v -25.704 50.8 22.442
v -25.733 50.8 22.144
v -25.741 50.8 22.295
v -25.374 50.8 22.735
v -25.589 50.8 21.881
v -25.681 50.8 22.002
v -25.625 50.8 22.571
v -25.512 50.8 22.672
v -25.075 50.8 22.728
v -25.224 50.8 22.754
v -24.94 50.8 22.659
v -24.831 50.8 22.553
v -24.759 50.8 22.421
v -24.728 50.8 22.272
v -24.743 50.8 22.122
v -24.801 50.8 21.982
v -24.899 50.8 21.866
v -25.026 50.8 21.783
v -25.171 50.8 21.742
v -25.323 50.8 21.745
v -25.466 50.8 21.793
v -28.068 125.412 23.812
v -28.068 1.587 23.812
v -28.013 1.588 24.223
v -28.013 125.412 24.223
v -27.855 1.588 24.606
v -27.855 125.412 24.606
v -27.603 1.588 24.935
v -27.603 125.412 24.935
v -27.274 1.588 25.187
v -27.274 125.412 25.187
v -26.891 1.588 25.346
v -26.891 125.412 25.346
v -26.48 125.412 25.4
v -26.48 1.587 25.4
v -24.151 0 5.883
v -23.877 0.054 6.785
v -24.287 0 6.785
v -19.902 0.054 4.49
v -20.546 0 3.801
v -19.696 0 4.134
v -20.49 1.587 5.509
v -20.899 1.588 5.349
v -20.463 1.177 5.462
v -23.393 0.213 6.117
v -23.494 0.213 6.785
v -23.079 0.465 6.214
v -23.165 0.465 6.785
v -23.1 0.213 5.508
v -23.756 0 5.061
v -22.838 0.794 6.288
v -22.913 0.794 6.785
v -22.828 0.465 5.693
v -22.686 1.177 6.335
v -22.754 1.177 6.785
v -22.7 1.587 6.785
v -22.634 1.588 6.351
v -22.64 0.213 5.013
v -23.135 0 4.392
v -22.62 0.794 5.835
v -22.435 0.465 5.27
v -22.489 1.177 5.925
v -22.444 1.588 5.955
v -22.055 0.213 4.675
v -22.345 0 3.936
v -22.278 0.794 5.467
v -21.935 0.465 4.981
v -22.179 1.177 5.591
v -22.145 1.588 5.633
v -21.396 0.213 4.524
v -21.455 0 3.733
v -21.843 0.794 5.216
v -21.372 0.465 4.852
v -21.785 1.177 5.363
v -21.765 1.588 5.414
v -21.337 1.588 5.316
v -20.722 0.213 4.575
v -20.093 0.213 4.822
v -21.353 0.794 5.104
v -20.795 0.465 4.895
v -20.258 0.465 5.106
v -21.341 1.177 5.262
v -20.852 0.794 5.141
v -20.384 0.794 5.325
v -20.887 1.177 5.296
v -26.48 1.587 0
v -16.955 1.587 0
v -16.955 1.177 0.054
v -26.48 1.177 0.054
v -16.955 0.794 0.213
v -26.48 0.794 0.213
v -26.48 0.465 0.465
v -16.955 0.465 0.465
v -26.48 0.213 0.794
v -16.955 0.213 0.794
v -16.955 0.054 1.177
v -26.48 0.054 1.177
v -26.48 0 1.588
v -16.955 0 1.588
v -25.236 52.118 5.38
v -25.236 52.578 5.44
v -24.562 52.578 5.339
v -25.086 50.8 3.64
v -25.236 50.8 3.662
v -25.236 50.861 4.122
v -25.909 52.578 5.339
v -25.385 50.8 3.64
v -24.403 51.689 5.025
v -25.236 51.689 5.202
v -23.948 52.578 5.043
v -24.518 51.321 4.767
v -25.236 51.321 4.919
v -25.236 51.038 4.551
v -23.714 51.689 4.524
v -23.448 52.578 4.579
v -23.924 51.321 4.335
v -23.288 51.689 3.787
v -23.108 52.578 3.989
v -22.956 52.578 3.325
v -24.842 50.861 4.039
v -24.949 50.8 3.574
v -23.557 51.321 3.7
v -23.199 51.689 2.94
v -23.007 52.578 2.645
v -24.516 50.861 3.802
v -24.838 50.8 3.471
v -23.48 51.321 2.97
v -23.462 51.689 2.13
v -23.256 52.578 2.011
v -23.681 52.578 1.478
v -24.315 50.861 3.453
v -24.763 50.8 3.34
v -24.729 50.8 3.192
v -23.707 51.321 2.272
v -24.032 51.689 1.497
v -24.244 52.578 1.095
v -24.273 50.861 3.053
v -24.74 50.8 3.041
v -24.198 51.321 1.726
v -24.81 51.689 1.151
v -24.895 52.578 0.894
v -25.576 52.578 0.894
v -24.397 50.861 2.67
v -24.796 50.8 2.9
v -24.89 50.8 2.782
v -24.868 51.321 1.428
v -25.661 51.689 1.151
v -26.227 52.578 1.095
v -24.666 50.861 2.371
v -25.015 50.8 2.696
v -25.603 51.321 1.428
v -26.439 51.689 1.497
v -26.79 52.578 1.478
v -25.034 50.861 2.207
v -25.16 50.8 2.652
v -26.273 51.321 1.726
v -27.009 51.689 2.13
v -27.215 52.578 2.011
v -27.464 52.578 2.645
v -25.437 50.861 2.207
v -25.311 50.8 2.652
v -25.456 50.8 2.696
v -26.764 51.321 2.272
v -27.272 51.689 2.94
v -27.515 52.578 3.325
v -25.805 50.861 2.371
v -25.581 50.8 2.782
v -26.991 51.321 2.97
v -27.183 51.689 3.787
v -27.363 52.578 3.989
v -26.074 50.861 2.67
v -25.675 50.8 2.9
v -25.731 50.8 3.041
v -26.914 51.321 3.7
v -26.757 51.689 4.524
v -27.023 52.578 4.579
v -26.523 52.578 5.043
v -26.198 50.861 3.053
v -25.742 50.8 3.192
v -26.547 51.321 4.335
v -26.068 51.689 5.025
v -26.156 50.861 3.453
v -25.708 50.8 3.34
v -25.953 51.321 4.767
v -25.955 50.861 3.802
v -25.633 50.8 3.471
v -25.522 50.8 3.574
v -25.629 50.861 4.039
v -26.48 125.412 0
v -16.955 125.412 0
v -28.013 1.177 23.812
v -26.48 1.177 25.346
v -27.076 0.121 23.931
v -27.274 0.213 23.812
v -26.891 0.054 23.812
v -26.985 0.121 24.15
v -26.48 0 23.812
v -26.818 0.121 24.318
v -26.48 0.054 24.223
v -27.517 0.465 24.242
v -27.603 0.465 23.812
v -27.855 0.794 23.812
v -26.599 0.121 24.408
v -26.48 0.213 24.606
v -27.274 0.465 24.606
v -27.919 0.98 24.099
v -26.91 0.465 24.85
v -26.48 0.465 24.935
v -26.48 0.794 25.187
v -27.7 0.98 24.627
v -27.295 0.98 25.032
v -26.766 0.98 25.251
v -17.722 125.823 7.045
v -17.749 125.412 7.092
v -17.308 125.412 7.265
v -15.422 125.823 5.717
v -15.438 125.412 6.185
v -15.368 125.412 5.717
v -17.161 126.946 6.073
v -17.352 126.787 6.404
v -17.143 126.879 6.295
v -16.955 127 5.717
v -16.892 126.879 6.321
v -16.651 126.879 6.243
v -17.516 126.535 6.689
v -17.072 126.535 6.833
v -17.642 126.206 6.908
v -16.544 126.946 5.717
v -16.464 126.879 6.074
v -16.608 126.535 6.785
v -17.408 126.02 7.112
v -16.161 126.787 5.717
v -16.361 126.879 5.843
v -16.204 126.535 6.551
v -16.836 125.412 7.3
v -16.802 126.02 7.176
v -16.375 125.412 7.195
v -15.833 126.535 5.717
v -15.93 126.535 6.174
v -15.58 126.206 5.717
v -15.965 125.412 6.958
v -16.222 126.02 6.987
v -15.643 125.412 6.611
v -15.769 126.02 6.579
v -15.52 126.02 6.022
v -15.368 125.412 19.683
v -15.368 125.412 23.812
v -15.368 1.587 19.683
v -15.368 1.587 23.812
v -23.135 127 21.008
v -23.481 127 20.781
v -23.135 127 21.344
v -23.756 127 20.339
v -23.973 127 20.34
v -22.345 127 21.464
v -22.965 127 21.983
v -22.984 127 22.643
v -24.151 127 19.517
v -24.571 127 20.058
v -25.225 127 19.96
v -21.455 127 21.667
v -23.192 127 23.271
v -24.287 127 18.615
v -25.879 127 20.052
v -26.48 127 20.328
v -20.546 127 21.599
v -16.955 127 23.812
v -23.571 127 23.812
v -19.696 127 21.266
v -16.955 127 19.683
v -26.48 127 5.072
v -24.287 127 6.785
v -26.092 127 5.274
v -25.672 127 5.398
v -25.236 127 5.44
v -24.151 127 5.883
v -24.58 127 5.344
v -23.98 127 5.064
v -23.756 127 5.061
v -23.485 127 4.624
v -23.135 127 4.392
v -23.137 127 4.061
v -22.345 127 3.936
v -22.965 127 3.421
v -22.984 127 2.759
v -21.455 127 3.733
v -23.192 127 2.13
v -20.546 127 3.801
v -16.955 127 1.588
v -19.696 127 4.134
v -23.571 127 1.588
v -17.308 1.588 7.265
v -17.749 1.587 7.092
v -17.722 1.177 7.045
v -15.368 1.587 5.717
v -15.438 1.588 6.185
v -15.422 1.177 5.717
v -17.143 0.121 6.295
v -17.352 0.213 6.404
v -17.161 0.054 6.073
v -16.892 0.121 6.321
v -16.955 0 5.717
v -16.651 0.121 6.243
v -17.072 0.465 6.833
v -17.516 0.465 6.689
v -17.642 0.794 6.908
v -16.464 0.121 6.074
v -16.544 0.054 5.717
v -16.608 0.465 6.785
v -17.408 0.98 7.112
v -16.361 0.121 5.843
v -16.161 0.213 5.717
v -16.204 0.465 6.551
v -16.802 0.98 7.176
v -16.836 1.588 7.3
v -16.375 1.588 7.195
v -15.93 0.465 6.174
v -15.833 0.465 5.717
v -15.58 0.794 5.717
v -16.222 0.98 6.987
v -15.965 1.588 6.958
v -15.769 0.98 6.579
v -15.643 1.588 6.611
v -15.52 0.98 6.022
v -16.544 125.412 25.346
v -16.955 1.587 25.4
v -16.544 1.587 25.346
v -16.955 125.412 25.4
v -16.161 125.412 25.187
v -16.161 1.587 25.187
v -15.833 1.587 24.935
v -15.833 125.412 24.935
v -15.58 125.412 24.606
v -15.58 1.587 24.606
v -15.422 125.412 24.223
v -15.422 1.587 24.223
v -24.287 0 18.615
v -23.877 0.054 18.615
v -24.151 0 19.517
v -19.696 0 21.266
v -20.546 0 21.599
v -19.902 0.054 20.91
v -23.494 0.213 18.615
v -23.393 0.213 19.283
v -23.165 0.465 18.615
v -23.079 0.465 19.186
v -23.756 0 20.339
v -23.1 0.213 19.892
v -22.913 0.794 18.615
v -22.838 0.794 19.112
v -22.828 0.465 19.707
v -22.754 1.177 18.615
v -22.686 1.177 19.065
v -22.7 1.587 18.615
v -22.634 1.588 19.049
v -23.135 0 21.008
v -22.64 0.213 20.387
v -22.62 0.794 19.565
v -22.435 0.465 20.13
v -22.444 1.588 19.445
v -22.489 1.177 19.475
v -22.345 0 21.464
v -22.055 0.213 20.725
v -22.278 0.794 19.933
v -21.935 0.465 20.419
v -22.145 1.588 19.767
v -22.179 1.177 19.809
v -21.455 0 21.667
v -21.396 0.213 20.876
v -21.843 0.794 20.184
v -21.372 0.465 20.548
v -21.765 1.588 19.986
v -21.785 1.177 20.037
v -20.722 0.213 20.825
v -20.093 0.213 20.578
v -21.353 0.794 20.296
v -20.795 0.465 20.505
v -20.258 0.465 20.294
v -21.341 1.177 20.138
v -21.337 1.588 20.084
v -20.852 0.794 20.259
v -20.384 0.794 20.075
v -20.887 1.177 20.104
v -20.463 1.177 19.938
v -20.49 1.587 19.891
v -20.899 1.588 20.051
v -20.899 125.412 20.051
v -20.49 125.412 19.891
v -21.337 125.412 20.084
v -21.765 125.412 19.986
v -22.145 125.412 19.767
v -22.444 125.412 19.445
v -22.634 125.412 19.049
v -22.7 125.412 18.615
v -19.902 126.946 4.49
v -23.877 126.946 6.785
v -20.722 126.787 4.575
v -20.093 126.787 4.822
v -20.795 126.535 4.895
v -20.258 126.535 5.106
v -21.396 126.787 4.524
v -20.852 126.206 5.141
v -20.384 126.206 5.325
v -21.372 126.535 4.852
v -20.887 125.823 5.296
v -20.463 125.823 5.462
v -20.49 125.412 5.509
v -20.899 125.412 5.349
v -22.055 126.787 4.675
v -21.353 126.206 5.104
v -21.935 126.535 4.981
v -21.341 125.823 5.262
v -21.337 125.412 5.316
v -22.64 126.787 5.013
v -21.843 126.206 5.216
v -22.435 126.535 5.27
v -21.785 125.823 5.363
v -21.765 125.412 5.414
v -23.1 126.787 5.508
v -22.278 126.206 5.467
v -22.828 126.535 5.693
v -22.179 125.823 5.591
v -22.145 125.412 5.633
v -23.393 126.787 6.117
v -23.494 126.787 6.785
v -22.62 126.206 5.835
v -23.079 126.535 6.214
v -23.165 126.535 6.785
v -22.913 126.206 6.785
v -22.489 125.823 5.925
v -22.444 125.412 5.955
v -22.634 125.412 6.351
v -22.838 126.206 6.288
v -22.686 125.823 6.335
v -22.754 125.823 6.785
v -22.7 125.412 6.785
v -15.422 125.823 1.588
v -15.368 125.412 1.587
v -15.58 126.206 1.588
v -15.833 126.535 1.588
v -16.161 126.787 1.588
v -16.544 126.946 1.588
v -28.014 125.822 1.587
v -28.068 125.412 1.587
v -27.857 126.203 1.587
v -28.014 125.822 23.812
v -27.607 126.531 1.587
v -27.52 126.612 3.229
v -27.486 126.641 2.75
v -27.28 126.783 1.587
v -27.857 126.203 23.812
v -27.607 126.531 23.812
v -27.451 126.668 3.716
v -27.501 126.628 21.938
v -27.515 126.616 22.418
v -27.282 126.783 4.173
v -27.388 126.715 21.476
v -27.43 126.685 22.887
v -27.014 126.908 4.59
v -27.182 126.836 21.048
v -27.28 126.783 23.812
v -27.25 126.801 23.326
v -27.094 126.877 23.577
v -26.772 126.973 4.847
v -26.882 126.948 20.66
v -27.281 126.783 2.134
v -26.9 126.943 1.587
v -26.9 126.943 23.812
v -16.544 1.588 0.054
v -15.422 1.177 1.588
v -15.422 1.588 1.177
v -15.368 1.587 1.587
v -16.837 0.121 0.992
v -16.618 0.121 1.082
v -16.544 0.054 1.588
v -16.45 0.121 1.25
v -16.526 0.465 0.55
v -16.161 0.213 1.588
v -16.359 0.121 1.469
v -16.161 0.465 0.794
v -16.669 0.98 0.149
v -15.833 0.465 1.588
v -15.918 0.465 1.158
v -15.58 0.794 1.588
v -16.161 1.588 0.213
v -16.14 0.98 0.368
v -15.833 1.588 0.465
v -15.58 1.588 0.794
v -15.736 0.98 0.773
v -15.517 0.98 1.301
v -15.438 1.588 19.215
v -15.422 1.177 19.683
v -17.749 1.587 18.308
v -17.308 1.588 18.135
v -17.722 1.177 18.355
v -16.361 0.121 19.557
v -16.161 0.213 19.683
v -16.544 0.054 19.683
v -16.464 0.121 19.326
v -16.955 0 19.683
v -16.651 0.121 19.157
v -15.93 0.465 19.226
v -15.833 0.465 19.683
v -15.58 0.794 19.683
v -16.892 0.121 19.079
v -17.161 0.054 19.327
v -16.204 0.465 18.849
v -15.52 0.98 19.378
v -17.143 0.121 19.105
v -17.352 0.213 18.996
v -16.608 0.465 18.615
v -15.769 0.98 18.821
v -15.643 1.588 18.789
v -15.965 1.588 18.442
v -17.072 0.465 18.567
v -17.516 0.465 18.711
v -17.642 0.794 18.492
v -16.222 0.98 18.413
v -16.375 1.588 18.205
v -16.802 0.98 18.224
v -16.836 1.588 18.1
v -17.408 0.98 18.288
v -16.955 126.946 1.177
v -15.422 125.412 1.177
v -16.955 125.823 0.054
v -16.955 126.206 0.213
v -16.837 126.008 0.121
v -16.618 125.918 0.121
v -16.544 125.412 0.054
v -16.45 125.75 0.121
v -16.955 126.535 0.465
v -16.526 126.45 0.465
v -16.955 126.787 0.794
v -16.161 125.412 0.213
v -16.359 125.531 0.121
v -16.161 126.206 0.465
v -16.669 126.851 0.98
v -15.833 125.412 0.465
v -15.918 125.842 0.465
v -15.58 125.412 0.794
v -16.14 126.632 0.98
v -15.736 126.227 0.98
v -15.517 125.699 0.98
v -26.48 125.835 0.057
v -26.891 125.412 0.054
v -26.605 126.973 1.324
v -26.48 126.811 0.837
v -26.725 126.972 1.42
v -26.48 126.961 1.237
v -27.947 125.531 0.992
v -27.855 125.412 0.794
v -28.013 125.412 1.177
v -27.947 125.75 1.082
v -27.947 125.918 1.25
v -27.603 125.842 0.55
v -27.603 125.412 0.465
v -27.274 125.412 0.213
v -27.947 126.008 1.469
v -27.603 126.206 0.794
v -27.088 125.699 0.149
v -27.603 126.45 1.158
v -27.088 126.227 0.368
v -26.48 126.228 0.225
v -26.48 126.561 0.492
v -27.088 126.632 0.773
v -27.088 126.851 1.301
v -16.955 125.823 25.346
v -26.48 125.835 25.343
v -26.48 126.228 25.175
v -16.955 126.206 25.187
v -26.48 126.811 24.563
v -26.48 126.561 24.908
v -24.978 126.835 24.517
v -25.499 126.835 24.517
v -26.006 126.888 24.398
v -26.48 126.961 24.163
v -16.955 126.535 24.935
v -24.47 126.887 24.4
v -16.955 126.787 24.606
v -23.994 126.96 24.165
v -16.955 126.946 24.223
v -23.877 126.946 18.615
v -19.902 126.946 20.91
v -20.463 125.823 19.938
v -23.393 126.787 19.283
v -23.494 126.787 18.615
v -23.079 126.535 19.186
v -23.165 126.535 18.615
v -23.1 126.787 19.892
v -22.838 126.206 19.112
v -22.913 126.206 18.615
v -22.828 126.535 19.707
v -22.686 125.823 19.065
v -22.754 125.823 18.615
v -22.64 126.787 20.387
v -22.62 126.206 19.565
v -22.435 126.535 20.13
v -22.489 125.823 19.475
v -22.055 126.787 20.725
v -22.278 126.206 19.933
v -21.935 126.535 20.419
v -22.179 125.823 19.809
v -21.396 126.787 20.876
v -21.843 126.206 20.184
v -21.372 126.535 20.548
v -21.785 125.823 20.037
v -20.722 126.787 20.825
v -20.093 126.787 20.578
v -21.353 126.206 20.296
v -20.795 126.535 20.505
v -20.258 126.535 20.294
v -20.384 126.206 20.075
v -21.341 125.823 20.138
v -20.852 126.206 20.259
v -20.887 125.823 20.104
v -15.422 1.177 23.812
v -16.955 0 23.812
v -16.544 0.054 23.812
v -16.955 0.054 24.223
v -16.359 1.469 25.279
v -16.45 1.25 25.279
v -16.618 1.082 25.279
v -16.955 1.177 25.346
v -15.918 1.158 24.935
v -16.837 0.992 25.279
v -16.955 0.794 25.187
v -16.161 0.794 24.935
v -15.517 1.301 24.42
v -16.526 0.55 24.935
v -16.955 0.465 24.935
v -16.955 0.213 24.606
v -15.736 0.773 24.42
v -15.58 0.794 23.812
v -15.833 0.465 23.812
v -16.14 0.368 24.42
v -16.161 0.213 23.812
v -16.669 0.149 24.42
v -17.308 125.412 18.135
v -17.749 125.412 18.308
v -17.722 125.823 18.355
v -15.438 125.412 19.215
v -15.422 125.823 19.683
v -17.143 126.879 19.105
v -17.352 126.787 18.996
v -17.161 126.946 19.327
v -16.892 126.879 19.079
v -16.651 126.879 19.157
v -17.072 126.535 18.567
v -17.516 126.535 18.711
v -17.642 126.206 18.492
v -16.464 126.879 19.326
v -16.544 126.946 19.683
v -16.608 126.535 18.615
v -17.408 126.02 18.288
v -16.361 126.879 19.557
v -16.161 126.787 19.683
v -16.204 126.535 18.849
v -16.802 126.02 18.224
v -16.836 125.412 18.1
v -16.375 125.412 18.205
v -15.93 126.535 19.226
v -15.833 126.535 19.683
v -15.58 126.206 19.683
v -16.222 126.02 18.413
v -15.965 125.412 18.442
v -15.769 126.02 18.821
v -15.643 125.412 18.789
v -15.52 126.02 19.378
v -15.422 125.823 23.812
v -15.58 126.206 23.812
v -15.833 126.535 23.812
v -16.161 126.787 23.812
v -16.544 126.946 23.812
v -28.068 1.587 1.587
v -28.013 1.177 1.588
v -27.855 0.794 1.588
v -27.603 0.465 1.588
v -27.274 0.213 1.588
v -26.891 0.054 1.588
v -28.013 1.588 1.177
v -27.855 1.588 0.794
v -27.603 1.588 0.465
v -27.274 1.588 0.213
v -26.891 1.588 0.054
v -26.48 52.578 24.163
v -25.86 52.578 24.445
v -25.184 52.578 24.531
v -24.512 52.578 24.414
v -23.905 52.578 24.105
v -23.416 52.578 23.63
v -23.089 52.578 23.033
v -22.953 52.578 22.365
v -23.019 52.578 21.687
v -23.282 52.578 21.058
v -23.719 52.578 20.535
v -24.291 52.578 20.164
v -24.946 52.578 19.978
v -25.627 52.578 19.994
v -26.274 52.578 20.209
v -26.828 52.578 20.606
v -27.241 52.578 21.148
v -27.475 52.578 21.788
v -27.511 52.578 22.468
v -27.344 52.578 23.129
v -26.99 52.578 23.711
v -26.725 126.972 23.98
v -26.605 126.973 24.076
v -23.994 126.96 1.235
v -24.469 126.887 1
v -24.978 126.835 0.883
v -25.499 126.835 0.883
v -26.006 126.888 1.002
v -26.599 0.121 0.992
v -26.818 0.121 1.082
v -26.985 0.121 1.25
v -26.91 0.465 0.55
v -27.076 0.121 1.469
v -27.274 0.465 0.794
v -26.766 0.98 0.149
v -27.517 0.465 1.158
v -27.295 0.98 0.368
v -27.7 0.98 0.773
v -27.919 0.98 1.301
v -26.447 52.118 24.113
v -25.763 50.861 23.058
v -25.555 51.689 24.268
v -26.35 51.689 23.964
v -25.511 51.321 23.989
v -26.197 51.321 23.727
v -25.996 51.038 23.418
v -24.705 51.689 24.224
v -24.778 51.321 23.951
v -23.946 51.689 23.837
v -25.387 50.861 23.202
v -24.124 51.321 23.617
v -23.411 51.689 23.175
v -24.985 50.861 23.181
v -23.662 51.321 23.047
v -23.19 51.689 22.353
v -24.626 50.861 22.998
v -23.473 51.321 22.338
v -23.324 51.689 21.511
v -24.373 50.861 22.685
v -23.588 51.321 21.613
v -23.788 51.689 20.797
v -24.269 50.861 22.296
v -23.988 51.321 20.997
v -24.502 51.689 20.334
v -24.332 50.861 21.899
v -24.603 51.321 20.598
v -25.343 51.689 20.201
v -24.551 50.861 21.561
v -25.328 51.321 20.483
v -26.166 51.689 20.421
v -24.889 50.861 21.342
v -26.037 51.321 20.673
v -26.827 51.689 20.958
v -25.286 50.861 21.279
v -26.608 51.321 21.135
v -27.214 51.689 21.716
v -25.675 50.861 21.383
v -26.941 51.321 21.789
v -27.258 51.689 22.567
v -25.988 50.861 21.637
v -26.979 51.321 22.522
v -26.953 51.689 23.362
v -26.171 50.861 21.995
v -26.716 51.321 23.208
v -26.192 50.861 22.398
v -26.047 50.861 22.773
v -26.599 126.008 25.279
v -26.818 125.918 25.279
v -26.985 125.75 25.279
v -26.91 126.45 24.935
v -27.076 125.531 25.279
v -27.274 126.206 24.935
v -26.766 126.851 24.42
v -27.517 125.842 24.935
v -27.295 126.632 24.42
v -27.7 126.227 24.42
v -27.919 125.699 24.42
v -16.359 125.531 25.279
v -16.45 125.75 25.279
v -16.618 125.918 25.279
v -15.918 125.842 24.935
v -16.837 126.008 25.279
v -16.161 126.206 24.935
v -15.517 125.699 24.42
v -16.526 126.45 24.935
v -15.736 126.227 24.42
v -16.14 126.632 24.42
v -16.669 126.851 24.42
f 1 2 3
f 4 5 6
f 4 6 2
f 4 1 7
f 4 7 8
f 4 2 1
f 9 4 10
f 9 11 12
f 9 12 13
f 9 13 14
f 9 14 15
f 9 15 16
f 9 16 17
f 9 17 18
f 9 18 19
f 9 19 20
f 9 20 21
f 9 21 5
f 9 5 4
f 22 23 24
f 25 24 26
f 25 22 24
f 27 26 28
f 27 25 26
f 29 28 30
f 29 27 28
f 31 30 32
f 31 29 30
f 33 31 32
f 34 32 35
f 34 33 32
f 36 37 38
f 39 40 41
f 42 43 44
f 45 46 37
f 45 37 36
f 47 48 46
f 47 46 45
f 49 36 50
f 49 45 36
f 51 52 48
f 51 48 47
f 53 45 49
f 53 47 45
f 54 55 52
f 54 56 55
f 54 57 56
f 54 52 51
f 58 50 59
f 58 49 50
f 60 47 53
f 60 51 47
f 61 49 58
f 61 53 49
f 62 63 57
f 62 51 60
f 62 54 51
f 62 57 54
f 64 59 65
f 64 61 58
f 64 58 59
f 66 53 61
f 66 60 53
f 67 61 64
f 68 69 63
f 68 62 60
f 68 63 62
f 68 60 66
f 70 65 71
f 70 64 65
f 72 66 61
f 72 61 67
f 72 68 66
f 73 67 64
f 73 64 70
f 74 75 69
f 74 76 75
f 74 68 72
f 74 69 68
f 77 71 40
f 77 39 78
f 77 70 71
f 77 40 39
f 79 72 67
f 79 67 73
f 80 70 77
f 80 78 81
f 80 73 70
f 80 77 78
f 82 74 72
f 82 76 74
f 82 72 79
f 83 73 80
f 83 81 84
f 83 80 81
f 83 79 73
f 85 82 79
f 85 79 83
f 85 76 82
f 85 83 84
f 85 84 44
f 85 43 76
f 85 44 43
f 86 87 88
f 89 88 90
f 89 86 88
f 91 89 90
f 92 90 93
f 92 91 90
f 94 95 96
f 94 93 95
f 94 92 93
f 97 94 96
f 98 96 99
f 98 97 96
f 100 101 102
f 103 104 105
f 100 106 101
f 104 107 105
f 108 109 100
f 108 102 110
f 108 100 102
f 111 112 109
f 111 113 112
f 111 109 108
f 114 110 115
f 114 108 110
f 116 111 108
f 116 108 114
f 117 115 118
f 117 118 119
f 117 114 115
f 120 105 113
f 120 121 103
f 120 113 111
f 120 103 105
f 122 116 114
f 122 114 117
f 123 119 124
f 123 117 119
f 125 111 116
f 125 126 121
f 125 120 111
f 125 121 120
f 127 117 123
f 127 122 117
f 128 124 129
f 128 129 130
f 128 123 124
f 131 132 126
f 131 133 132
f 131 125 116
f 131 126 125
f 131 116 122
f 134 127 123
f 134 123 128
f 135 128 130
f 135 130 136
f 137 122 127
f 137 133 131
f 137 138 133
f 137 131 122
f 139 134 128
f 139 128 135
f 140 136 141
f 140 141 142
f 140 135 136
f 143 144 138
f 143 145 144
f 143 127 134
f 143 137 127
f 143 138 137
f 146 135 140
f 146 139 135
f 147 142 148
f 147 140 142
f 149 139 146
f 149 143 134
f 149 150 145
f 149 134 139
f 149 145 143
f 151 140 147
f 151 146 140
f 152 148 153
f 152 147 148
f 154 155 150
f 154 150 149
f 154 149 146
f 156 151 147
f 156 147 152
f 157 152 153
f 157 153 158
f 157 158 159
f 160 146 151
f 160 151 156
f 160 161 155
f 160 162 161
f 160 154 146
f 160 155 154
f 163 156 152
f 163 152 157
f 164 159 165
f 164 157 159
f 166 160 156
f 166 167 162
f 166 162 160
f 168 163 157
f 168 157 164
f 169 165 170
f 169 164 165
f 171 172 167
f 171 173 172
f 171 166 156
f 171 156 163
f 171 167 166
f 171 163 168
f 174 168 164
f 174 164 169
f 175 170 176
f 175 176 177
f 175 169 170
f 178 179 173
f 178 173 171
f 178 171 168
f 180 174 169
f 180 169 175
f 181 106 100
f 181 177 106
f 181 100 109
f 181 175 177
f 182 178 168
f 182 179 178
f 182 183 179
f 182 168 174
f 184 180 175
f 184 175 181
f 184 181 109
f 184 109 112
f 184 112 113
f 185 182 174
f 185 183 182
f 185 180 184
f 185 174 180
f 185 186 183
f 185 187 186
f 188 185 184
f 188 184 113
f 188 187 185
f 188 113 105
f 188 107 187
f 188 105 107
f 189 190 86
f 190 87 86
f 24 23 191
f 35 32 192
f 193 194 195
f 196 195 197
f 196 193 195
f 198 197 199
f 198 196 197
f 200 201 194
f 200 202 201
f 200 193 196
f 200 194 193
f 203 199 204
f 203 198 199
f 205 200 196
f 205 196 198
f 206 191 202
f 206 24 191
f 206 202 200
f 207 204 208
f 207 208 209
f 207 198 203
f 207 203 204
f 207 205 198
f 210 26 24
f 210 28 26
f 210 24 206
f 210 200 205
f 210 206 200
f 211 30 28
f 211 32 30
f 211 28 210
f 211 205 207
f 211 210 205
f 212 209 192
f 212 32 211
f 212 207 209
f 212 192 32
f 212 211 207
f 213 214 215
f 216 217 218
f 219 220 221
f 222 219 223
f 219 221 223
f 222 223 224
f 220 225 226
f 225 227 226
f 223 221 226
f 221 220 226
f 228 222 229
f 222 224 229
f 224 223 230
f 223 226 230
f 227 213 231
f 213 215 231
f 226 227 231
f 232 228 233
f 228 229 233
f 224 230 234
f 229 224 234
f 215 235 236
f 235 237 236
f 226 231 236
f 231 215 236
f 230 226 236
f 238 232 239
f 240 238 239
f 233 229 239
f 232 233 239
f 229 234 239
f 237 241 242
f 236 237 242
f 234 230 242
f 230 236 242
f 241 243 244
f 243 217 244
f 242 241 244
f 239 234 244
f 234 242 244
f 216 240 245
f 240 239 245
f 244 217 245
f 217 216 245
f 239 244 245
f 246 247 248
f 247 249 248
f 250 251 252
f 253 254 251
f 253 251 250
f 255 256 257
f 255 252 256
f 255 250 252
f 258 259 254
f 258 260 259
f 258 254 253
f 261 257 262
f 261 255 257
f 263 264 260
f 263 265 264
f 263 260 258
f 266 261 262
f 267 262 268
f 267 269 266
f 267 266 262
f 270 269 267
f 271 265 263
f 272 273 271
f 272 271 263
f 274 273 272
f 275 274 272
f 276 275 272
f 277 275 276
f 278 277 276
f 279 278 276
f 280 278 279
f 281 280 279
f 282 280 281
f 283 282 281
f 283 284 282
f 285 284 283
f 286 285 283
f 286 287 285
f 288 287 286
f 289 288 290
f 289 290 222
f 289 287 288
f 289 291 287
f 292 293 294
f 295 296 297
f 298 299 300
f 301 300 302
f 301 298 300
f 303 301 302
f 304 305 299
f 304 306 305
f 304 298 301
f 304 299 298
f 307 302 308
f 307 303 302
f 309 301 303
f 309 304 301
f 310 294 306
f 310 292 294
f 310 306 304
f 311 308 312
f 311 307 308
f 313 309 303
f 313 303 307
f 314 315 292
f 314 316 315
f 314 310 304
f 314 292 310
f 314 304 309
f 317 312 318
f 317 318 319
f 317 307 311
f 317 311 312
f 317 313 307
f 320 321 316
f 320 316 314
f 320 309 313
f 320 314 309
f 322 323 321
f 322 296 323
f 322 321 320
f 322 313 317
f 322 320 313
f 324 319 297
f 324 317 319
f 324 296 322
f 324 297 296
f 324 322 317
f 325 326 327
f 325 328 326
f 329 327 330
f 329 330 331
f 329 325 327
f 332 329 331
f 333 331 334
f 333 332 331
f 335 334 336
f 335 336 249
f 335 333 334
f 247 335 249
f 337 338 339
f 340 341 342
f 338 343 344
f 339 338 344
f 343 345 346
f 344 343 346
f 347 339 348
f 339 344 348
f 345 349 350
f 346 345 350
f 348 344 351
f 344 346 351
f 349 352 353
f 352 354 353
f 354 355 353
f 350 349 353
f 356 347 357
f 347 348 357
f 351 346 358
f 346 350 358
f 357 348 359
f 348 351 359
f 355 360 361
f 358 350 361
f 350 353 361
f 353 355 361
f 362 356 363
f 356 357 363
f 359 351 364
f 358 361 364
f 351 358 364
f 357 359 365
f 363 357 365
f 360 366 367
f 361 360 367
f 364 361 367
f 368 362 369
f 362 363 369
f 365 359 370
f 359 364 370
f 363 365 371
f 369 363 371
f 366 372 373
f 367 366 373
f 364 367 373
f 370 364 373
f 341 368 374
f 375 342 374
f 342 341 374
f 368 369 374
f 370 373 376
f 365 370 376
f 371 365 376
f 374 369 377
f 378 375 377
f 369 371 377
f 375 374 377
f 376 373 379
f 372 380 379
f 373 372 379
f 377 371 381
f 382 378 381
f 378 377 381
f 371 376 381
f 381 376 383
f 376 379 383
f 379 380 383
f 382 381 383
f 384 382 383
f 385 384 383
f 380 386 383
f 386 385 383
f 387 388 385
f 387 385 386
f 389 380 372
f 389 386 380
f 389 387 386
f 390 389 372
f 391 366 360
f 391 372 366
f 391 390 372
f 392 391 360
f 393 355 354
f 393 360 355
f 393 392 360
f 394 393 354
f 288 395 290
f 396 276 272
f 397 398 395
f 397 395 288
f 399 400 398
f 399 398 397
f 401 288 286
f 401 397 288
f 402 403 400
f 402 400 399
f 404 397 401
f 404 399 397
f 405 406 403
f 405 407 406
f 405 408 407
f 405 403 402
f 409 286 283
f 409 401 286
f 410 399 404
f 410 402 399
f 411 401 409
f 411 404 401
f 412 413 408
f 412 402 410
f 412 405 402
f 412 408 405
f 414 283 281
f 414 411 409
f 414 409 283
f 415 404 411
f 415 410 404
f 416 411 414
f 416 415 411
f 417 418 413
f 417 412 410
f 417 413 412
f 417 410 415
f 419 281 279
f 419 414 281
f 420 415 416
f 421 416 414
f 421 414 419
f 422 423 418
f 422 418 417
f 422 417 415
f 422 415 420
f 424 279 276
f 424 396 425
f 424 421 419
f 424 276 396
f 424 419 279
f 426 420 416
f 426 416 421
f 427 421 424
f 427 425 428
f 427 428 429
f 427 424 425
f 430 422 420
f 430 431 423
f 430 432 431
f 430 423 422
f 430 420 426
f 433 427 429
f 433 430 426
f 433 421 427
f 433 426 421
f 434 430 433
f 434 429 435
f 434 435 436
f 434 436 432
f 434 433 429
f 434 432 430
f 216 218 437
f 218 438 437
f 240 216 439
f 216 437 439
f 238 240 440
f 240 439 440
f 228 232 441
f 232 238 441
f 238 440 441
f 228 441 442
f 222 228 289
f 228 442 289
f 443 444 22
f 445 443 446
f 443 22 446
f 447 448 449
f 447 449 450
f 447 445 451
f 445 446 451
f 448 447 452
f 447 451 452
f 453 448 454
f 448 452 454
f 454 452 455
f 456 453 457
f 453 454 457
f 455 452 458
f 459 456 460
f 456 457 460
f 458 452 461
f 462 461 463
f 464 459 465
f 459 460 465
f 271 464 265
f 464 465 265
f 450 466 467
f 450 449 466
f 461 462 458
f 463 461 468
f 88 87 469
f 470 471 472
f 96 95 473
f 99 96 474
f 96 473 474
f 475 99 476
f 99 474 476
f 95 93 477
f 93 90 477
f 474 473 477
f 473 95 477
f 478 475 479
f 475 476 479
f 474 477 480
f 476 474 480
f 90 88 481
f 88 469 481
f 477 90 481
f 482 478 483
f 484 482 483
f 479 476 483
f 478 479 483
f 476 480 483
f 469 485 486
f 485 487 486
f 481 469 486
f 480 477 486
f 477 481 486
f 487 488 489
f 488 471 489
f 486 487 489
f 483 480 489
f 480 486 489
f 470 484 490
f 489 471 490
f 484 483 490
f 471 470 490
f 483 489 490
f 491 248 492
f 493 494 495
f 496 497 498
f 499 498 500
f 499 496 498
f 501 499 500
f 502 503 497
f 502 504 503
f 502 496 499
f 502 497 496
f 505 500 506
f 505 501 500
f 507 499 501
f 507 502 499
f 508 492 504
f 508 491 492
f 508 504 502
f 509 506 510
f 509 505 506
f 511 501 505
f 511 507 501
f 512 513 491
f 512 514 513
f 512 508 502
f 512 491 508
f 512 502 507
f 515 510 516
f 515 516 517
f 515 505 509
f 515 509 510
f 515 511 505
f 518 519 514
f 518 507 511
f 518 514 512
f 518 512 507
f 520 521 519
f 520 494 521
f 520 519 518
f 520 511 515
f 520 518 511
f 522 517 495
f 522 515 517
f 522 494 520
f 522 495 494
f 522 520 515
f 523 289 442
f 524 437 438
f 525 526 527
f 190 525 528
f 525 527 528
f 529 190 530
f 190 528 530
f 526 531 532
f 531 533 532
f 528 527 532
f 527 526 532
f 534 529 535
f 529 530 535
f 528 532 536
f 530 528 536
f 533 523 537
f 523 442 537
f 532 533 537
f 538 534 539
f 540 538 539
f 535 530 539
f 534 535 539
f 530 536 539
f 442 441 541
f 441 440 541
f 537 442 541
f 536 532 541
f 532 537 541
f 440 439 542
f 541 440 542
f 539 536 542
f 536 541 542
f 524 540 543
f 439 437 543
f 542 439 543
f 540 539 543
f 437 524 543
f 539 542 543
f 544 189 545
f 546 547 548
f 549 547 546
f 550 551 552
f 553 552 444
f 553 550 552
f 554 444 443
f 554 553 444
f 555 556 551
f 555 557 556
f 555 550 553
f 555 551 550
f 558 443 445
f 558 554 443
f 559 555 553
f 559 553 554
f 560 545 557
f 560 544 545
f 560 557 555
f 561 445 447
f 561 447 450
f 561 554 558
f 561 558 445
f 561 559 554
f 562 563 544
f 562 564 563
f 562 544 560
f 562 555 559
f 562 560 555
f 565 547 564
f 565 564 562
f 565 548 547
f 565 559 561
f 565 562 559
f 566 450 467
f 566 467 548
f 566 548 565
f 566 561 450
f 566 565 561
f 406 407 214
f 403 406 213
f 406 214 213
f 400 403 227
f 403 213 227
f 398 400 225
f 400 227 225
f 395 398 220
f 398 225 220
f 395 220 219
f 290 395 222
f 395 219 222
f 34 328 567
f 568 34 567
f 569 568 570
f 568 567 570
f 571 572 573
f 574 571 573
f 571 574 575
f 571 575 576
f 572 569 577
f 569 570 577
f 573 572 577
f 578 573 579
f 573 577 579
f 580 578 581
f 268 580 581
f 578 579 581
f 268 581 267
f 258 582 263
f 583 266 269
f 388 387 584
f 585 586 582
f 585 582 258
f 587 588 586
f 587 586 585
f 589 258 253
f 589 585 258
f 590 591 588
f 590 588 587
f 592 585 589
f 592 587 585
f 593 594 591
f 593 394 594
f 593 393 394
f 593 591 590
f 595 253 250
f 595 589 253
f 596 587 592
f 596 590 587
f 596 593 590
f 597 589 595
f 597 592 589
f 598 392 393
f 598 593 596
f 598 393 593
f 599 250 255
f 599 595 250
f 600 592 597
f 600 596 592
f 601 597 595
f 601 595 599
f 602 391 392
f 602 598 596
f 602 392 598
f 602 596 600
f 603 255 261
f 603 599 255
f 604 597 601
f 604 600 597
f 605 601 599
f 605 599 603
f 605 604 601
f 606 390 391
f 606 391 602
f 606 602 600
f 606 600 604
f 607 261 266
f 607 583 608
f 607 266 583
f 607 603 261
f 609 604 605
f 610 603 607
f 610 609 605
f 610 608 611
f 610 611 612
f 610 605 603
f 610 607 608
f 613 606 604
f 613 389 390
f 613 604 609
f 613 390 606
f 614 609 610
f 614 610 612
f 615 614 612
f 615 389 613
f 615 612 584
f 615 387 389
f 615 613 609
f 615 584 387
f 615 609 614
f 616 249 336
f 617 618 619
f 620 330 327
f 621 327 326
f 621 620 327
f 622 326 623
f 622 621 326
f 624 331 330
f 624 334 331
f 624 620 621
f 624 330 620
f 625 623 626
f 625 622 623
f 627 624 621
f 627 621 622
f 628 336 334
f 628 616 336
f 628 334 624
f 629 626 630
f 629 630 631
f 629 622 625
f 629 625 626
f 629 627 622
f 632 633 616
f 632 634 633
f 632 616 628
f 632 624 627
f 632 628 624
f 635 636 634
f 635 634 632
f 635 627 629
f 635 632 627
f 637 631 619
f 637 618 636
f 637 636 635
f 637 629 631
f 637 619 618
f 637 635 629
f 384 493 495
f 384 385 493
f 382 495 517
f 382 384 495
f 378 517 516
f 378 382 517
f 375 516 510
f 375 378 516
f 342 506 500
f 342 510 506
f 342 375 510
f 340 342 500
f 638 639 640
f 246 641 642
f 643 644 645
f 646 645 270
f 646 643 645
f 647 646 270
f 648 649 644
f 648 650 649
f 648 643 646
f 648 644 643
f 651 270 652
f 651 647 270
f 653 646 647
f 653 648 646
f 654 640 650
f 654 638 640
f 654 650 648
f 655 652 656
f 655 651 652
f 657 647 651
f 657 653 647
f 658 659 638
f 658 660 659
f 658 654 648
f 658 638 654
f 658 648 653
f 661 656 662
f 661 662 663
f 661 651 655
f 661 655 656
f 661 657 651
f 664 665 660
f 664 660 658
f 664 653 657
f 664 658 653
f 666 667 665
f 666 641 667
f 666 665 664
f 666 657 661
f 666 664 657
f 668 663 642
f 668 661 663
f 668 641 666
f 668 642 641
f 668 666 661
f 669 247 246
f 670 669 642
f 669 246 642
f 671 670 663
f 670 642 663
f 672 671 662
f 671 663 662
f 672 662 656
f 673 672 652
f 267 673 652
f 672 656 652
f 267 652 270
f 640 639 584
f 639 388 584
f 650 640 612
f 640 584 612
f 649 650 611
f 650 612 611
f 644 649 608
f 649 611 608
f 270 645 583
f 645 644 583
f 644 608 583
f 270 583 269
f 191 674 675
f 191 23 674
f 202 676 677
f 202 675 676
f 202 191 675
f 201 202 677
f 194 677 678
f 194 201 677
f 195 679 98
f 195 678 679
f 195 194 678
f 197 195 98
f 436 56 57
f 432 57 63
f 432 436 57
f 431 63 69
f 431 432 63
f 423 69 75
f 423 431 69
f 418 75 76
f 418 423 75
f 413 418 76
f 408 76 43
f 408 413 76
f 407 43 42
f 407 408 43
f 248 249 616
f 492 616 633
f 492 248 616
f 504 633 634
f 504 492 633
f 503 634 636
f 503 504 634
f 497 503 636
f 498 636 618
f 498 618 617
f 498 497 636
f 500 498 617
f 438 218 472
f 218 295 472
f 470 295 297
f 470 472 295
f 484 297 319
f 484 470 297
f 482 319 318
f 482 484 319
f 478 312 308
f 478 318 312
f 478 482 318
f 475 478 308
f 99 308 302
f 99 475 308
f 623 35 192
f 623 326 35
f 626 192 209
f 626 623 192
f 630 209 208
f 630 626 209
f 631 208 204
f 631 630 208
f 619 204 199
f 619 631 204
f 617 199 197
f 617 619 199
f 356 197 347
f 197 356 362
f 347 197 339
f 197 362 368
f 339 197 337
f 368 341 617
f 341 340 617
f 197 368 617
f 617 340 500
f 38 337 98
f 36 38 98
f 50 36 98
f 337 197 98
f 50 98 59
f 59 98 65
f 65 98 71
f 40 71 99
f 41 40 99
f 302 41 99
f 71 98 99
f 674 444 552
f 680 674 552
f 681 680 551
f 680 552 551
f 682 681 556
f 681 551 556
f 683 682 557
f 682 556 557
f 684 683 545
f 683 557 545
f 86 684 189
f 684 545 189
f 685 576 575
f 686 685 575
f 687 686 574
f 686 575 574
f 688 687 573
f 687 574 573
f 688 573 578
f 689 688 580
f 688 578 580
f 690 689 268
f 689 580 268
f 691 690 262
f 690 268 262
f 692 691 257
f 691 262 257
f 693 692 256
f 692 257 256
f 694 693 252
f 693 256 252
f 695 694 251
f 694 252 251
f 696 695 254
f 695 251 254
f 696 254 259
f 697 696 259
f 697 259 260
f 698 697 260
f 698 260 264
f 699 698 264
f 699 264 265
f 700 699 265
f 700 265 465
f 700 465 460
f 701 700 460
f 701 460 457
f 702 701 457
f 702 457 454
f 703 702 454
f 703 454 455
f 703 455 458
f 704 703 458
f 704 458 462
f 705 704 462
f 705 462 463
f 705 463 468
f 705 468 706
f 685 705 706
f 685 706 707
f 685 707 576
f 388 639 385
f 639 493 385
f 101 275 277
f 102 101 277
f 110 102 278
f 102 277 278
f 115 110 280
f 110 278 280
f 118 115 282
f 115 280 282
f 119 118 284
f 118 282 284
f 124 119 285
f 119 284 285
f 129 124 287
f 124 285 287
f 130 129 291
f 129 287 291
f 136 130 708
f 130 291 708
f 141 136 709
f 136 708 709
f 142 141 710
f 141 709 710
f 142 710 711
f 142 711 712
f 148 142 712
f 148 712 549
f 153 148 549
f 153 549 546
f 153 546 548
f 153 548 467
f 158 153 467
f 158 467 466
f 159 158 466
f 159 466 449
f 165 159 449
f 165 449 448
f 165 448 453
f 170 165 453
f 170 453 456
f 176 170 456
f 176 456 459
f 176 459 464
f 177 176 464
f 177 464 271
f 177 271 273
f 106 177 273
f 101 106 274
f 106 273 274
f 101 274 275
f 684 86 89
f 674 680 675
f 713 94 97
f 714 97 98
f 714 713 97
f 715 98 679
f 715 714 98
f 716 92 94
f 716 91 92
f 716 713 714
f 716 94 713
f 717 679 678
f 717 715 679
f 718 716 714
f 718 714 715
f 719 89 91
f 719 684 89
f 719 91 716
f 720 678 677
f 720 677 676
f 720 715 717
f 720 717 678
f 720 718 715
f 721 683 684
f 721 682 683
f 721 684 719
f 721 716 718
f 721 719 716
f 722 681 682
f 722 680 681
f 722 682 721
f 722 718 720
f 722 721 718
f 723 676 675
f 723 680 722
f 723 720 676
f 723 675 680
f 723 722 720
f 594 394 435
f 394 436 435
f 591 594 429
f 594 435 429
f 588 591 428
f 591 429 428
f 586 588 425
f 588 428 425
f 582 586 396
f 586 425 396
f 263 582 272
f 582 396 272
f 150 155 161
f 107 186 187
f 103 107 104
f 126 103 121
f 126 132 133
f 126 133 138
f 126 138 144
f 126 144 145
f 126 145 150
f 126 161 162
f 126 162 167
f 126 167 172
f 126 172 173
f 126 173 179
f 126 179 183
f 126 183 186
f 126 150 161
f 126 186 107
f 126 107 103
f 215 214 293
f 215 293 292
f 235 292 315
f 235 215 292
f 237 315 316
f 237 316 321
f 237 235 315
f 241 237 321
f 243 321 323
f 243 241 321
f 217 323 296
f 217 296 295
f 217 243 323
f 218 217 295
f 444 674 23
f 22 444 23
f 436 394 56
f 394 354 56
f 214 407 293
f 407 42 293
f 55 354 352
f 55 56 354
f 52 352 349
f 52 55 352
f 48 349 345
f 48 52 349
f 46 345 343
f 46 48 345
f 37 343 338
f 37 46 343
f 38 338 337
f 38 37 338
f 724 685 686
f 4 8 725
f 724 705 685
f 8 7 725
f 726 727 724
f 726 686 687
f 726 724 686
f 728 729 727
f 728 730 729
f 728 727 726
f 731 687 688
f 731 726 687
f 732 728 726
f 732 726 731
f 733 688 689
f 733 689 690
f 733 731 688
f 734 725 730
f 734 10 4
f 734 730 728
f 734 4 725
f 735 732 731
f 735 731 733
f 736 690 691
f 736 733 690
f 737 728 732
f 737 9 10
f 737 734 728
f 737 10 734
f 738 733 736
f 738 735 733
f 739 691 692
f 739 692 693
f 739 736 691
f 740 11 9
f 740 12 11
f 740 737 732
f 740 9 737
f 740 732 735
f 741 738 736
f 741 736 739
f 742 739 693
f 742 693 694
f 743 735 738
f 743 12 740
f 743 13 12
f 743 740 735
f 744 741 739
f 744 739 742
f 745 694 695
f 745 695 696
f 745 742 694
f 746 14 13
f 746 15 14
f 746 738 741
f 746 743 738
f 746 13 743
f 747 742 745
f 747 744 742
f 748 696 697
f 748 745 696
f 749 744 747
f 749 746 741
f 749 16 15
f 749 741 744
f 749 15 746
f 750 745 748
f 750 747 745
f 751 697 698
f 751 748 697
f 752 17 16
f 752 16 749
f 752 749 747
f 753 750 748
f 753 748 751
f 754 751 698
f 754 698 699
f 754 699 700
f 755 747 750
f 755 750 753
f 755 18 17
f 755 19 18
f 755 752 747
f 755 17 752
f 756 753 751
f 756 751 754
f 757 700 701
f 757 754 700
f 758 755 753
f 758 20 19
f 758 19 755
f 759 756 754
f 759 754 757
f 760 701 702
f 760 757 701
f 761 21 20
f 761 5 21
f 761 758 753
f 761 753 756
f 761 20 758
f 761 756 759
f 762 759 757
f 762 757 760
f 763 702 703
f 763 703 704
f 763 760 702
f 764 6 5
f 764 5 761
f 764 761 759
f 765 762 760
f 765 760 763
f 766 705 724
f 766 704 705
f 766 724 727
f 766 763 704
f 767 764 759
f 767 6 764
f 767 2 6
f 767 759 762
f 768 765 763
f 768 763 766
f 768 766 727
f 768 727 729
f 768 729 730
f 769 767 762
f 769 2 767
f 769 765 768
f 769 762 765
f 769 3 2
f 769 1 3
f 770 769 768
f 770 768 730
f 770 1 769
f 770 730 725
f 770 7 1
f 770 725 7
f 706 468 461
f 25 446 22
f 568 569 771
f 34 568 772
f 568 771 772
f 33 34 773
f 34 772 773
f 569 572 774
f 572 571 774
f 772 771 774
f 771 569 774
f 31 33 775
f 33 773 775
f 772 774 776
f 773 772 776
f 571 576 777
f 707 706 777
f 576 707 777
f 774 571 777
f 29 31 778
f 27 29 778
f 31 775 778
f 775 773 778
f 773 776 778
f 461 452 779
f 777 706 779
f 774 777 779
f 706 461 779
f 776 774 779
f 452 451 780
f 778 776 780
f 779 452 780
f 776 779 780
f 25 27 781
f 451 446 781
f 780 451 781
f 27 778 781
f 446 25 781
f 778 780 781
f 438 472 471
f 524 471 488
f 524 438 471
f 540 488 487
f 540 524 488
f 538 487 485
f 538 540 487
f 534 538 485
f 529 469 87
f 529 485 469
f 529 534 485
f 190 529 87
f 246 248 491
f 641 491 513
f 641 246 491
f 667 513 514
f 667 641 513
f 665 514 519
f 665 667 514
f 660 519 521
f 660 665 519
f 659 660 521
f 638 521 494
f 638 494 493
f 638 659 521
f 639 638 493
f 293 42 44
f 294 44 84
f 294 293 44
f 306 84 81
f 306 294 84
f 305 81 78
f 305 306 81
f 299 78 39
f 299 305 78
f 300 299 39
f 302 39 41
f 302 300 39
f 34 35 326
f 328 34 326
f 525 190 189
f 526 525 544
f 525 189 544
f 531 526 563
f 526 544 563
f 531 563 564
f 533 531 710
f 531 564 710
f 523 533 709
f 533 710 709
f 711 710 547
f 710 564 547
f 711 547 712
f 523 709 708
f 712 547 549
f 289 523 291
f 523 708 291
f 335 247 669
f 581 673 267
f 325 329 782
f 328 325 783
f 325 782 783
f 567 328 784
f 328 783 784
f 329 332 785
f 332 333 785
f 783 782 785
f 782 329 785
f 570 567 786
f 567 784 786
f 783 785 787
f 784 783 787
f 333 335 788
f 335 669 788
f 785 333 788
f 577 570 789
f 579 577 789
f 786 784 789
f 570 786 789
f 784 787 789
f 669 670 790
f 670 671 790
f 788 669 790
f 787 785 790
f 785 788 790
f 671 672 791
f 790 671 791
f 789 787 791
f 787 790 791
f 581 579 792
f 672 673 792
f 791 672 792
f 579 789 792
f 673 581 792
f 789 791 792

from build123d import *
from OCP.BRepFilletAPI import BRepFilletAPI_MakeFillet

# Parameters (mm, degrees)
BOSS_EXTRUDE2_DEPTH = 127
FILLET1_R1          = 1.5875
FILLET1_R2          = 1.4732
SKETCH2_R           = 2.286
CUT_EXTRUDE1_DEPTH  = 76.2
FILLET3_R           = 1.778


with BuildPart() as part:
    # Sketch1 → Boss-Extrude2 (new body)
    with BuildSketch(Plane(origin=(0, 0, 0), x_dir=(1, 0, 0), z_dir=(0, 1, 0))):
        Polygon((-28.067579909, 0), (-28.067579909, -25.4), (-15.367579909, -25.4), (-15.367579909, -16.933333333), (-22.699928279, -21.166666582), (-22.699928279, -4.233333249), (-15.367579909, -8.466666667), (-15.367579909, 0), align=None)
    extrude(amount=BOSS_EXTRUDE2_DEPTH)

    # Fillet1: one fillet with a radius per group of edges: ONE call of the kernel's fillet builder (fillet() takes one radius for all edges)
    fillet1_edges_1 = [part.edges().sort_by_distance(p)[0] for p in [
        (-19.033754094, 127, 6.349999958),
        (-22.699928279, 127, 12.699999915),
        (-19.033754094, 127, 19.049999958),
        (-15.367579909, 127, 21.166666667),
        (-15.367579909, 127, 4.233333333),
        (-21.717579909, 127, 0),
        (-28.067579909, 63.5, 0),
        (-15.367579909, 63.5, 0),
        (-21.717579909, 0, 0),
        (-15.367579909, 0, 4.233333333),
        (-15.367579909, 63.5, 8.466666667),
        (-15.367579909, 63.5, 16.933333333),
        (-15.367579909, 0, 21.166666667),
        (-15.367579909, 63.5, 25.4),
        (-22.699928279, 0, 12.699999915),
        (-28.067579909, 127, 12.7),
        (-21.717579909, 127, 25.4),
        (-28.067579909, 63.5, 25.4),
        (-28.067579909, 0, 12.7),
        (-21.717579909, 0, 25.4),
        (-19.033754094, 0, 6.349999958),
        (-19.033754094, 0, 19.049999958),
    ]]
    fillet1_edges_2 = [part.edges().sort_by_distance(p)[0] for p in [
        (-22.699928279, 63.5, 4.233333249),
        (-22.699928279, 63.5, 21.166666582),
    ]]
    fillet1 = BRepFilletAPI_MakeFillet(part.part.solid().wrapped)
    for e in fillet1_edges_1:
        fillet1.Add(FILLET1_R1, e.wrapped)
    for e in fillet1_edges_2:
        fillet1.Add(FILLET1_R2, e.wrapped)
    add(Compound.cast(fillet1.Shape()), mode=Mode.REPLACE)

    # Sketch2 → Cut-Extrude1 (cut)
    with BuildSketch(Plane(origin=(0, 127, 0), x_dir=(1, 0, 0), z_dir=(0, 1, 0))):
        with Locations((-25.235504788, -3.154170131)):
            Circle(SKETCH2_R)
        with Locations((-25.235504788, -22.245829751)):
            Circle(SKETCH2_R)
    extrude(amount=-CUT_EXTRUDE1_DEPTH, mode=Mode.SUBTRACT)

    # Fillet3
    fillet3_edges = [part.edges().sort_by_distance(p)[0] for p in [
        (-27.521504788, 50.8, 3.154170131),
        (-27.521504788, 50.8, 22.245829751),
    ]]
    fillet(fillet3_edges, radius=FILLET3_R)


solid = part.part
